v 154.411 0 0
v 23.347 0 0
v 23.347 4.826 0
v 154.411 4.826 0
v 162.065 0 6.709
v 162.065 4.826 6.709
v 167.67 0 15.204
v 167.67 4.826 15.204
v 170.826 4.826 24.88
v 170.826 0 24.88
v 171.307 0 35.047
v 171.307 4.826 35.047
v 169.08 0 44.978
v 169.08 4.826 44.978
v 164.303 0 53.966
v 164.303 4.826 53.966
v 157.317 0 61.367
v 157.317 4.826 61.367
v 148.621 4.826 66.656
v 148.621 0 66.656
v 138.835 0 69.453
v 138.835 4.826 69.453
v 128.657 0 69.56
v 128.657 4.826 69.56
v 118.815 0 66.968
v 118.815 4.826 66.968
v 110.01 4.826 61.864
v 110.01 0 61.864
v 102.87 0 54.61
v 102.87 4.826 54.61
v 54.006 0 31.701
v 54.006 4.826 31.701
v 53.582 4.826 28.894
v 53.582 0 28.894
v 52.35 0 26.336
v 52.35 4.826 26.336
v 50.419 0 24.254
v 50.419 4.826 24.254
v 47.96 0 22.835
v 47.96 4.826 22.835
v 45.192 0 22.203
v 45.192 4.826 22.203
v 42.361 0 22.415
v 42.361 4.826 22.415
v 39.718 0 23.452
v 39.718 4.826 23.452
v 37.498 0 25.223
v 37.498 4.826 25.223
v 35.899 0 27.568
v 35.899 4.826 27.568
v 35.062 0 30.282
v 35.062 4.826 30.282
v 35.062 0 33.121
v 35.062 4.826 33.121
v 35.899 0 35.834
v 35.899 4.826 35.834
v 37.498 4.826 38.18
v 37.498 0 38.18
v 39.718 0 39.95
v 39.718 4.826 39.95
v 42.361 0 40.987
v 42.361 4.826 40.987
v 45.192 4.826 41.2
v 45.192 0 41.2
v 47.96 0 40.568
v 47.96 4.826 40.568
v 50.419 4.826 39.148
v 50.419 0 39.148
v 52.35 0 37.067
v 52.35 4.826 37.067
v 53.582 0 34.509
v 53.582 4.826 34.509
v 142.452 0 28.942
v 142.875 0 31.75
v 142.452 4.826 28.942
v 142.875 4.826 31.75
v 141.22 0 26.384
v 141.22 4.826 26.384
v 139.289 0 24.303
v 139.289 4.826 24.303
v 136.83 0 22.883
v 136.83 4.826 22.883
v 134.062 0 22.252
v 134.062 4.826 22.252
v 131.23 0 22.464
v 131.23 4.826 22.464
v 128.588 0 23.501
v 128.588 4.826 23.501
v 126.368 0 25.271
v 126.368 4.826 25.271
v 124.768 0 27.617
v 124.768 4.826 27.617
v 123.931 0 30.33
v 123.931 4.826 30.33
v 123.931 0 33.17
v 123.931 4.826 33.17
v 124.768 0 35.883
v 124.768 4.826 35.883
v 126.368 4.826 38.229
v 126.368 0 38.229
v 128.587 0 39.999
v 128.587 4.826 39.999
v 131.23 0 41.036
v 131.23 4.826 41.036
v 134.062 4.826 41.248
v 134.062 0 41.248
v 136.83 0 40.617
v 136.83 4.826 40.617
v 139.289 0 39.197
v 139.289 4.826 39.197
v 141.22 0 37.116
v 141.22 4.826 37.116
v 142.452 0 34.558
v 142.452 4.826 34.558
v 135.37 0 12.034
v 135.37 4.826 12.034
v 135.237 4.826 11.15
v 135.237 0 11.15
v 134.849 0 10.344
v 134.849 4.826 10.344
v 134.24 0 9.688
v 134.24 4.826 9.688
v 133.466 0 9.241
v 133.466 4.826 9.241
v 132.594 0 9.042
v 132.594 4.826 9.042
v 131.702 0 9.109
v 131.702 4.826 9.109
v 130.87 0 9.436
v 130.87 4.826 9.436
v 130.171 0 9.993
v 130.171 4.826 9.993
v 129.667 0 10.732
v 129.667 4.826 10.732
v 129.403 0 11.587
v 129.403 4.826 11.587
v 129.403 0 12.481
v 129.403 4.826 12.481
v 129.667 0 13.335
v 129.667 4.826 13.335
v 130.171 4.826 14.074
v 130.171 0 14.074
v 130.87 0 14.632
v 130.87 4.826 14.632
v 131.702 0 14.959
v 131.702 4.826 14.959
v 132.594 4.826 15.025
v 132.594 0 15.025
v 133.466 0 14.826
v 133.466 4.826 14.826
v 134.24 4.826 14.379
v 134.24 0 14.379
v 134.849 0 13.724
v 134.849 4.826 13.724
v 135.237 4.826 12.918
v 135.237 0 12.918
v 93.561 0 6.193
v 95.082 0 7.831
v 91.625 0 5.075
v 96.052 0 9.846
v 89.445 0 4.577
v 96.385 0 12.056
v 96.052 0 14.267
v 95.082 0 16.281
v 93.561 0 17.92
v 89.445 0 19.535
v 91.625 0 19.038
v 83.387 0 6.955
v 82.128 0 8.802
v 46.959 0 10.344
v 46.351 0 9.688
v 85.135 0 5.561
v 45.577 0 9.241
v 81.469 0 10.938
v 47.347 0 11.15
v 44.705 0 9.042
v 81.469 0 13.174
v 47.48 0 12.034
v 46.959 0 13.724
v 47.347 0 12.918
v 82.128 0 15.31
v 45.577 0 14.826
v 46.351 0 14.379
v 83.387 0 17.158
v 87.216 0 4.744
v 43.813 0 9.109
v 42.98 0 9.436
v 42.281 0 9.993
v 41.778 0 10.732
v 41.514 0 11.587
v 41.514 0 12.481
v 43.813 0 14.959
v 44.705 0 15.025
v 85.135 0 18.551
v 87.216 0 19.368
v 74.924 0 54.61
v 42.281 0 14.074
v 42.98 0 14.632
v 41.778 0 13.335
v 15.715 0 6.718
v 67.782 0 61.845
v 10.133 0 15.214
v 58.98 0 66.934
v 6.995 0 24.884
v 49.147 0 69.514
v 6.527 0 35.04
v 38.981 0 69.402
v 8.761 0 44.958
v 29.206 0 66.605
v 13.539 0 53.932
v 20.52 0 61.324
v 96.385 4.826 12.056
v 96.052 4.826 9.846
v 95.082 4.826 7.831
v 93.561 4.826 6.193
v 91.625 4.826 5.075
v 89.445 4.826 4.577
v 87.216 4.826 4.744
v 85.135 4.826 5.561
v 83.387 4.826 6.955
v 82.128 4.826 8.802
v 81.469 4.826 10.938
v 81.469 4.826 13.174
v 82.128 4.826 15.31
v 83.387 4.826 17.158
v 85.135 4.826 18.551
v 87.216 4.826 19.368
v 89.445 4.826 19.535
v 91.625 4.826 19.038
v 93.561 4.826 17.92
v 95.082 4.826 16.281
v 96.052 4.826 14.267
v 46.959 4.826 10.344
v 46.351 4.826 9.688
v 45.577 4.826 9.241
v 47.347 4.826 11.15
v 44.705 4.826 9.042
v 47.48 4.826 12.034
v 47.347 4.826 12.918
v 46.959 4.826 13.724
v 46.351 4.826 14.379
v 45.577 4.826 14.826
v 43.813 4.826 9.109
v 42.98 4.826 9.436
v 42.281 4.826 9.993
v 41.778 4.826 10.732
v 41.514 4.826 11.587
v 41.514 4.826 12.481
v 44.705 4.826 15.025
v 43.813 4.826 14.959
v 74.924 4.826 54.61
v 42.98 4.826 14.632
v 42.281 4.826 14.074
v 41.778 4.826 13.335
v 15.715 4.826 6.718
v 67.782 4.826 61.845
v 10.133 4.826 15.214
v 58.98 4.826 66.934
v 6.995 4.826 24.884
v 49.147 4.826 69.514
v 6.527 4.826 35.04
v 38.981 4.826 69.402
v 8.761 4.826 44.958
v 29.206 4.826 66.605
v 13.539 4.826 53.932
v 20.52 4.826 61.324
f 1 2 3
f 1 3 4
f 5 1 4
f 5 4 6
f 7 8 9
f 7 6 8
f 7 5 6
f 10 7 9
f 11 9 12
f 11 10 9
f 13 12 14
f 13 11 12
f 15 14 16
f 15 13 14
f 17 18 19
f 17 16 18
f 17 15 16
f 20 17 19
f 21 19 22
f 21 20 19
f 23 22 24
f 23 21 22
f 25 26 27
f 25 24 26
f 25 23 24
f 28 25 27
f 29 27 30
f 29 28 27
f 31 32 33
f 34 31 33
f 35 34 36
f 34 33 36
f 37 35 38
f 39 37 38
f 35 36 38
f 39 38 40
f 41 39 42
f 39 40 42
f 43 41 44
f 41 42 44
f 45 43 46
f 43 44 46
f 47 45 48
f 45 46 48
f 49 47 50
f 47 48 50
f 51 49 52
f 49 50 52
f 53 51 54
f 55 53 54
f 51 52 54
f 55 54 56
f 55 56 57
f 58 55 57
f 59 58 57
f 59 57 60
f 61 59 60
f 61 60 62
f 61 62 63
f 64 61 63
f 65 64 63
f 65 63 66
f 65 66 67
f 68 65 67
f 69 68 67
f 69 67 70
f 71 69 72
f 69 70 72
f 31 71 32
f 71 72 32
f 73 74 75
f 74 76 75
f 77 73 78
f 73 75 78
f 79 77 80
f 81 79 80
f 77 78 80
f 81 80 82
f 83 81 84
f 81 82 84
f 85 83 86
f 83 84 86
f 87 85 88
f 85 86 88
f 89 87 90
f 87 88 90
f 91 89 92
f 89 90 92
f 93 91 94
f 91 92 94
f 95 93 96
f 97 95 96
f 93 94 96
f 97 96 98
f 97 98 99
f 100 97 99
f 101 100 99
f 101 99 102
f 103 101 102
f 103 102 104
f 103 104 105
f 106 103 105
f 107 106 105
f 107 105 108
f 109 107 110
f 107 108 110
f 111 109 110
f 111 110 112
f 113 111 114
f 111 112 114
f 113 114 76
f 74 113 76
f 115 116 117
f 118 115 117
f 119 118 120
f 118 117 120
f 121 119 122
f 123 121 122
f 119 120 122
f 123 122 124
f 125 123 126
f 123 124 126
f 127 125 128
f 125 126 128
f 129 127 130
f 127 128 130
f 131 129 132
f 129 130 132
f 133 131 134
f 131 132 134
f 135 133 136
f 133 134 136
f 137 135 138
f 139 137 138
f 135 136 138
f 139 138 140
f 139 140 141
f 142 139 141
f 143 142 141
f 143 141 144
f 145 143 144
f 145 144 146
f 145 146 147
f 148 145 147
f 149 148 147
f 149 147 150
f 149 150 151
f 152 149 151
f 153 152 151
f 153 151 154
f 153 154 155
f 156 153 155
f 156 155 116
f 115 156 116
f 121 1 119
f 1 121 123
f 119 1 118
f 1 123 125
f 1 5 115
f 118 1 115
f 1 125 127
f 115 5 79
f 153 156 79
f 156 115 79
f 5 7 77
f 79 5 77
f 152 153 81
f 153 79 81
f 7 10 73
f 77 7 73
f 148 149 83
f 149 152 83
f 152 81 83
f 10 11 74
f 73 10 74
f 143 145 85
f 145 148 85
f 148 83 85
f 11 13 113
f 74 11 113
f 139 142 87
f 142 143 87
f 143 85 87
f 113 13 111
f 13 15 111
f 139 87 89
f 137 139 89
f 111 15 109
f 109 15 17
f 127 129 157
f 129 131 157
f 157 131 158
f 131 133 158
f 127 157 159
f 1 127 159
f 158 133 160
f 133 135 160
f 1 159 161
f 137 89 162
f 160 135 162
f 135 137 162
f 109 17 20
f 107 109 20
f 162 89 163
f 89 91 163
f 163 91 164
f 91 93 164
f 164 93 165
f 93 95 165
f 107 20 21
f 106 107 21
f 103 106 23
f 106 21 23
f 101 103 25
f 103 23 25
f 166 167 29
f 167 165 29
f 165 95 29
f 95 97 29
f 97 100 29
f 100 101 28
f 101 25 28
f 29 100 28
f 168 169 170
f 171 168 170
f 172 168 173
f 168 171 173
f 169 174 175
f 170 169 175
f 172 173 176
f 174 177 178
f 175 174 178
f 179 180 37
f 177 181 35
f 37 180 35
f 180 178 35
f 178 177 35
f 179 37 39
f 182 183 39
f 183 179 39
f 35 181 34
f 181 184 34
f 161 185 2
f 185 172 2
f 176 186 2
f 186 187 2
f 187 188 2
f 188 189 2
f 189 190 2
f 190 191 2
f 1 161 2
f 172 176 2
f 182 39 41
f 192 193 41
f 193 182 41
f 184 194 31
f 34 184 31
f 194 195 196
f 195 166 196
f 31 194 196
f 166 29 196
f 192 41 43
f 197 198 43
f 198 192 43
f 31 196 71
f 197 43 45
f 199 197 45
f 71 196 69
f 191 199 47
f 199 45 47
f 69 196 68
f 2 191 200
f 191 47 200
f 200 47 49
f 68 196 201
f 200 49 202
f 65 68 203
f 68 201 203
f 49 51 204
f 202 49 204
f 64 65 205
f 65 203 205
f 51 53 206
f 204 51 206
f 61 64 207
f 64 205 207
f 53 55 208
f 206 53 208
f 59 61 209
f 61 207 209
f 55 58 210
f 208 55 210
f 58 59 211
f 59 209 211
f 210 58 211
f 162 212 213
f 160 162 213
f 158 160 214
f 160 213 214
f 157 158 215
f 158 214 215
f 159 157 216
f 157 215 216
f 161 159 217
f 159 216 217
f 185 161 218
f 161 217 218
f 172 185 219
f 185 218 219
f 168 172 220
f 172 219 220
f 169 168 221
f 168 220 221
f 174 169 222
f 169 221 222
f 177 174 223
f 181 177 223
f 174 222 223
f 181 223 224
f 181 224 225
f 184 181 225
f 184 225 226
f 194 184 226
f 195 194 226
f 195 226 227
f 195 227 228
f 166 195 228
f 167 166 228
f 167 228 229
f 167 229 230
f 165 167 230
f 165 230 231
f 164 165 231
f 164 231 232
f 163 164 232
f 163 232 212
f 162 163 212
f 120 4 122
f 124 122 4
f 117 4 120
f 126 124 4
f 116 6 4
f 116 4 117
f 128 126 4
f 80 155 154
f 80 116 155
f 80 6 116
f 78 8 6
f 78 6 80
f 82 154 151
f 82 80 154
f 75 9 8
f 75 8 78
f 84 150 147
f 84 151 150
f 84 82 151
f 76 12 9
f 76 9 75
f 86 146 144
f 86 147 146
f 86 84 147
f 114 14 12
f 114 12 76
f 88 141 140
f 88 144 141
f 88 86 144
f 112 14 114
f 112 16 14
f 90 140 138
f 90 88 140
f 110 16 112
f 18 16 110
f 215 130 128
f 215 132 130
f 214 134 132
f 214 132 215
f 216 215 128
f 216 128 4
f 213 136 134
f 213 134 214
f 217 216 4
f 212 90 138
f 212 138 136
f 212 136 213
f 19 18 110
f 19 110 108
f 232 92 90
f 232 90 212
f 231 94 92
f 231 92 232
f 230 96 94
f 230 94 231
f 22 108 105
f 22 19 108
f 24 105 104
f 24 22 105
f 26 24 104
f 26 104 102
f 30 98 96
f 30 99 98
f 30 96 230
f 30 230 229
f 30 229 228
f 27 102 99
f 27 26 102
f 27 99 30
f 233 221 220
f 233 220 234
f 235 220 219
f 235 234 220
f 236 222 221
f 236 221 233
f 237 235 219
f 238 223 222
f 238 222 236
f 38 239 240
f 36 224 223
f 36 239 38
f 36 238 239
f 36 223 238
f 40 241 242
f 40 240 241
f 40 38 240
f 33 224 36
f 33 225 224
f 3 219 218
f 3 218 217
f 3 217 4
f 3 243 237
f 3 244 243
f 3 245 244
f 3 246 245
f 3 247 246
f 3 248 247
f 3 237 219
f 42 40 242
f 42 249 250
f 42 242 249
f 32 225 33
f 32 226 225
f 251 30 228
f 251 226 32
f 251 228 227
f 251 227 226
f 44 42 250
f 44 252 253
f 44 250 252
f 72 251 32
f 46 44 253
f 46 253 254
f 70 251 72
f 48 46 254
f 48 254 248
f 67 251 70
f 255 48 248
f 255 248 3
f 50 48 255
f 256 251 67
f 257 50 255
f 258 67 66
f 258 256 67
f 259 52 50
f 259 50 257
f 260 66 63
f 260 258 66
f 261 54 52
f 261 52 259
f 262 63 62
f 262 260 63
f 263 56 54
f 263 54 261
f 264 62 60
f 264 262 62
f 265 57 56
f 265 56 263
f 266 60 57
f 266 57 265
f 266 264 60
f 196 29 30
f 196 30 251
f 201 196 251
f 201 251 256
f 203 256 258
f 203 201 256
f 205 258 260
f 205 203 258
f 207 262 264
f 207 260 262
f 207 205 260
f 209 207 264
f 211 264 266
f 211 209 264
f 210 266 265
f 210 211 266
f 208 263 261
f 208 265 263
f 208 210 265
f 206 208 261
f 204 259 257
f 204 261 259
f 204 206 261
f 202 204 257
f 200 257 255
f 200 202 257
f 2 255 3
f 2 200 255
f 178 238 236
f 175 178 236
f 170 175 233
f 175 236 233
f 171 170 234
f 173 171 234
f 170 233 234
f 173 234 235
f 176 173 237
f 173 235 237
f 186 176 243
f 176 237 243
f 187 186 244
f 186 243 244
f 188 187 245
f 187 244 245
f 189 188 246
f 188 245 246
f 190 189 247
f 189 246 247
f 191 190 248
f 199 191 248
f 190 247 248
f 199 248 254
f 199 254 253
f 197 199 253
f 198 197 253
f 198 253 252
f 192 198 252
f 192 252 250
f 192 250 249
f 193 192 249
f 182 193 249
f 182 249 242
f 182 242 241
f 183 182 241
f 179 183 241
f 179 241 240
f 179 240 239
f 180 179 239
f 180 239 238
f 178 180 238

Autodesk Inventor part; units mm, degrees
ref_plane "YZ Plane" through (0, 0, 0) normal (1, 0, 0) x (0, 1, 0)
ref_plane "XZ Plane" through (0, 0, 0) normal (0, 1, 0) x (-1, 0, 0)
ref_plane "XY Plane" through (0, 0, 0) normal (0, 0, 1) x (1, 0, 0)
sketch "Sketch1" plane through (0, 0, 0) normal (0, 1, 0) x (-1, 0, 0)
  line L0 (-23.3466, 0) -> (-154.4106, 0)
  line L1 (-102.87, 54.61) -> (-74.9238, 54.61)
  line L2 (-88.9, 0) -> (-23.3466, 0)
  line L3 (-88.9, 0) -> (-154.4106, 0)
  arc A0 (-102.87, 54.61) -> (-154.4106, 0) centre (-133.35, 31.75) ccw
  arc A1 (-23.3466, 0) -> (-74.9238, 54.61) centre (-44.4805, 31.7012) ccw
  point P0 (0, 0)
  dimension "d0" = 76.2
  dimension "d1" = 76.2
  dimension "d2" = 131.064
  dimension "d12" = 54.61
extrude "Extrusion1" add sketch "Sketch1" along normal blind 4.826
sketch "Sketch2" plane through (0, 4.826, 0) normal (0, 1, 0) x (1, 0, 0)
  line L0 (154.4106, 0) -> (23.3466, 0) projected
  arc A0 (23.3466, 0) -> (74.9238, -54.61) centre (44.4805, -31.7012) ccw projected
  line L1 (74.9238, -54.61) -> (102.87, -54.61) projected
  arc A1 (102.87, -54.61) -> (154.4106, 0) centre (133.35, -31.75) ccw projected
  circle A2 centre (44.4805, -31.7012) radius 9.525
  circle A3 centre (133.35, -31.75) radius 9.525
  line L2 (88.8786, 0) -> (88.8969, -54.61)
  line L3 (88.891, -24.1125) -> (88.8786, 0)
  circle A4 centre (132.3699, -12.0338) radius 3
  circle A5 centre (44.4805, -12.0338) radius 3
  circle A6 centre (88.8848, -12.0563) radius 7.5
  point P0 (0, 0)
  dimension "d9" = 6
  dimension "d10" = 6
  dimension "d11" = 15
extrude "Extrusion2" cut sketch "Sketch2" against normal through all contours A6 L2 | L2 A6 | A2 | A3 | A4 | A5
properties part number "paitent remote top"
